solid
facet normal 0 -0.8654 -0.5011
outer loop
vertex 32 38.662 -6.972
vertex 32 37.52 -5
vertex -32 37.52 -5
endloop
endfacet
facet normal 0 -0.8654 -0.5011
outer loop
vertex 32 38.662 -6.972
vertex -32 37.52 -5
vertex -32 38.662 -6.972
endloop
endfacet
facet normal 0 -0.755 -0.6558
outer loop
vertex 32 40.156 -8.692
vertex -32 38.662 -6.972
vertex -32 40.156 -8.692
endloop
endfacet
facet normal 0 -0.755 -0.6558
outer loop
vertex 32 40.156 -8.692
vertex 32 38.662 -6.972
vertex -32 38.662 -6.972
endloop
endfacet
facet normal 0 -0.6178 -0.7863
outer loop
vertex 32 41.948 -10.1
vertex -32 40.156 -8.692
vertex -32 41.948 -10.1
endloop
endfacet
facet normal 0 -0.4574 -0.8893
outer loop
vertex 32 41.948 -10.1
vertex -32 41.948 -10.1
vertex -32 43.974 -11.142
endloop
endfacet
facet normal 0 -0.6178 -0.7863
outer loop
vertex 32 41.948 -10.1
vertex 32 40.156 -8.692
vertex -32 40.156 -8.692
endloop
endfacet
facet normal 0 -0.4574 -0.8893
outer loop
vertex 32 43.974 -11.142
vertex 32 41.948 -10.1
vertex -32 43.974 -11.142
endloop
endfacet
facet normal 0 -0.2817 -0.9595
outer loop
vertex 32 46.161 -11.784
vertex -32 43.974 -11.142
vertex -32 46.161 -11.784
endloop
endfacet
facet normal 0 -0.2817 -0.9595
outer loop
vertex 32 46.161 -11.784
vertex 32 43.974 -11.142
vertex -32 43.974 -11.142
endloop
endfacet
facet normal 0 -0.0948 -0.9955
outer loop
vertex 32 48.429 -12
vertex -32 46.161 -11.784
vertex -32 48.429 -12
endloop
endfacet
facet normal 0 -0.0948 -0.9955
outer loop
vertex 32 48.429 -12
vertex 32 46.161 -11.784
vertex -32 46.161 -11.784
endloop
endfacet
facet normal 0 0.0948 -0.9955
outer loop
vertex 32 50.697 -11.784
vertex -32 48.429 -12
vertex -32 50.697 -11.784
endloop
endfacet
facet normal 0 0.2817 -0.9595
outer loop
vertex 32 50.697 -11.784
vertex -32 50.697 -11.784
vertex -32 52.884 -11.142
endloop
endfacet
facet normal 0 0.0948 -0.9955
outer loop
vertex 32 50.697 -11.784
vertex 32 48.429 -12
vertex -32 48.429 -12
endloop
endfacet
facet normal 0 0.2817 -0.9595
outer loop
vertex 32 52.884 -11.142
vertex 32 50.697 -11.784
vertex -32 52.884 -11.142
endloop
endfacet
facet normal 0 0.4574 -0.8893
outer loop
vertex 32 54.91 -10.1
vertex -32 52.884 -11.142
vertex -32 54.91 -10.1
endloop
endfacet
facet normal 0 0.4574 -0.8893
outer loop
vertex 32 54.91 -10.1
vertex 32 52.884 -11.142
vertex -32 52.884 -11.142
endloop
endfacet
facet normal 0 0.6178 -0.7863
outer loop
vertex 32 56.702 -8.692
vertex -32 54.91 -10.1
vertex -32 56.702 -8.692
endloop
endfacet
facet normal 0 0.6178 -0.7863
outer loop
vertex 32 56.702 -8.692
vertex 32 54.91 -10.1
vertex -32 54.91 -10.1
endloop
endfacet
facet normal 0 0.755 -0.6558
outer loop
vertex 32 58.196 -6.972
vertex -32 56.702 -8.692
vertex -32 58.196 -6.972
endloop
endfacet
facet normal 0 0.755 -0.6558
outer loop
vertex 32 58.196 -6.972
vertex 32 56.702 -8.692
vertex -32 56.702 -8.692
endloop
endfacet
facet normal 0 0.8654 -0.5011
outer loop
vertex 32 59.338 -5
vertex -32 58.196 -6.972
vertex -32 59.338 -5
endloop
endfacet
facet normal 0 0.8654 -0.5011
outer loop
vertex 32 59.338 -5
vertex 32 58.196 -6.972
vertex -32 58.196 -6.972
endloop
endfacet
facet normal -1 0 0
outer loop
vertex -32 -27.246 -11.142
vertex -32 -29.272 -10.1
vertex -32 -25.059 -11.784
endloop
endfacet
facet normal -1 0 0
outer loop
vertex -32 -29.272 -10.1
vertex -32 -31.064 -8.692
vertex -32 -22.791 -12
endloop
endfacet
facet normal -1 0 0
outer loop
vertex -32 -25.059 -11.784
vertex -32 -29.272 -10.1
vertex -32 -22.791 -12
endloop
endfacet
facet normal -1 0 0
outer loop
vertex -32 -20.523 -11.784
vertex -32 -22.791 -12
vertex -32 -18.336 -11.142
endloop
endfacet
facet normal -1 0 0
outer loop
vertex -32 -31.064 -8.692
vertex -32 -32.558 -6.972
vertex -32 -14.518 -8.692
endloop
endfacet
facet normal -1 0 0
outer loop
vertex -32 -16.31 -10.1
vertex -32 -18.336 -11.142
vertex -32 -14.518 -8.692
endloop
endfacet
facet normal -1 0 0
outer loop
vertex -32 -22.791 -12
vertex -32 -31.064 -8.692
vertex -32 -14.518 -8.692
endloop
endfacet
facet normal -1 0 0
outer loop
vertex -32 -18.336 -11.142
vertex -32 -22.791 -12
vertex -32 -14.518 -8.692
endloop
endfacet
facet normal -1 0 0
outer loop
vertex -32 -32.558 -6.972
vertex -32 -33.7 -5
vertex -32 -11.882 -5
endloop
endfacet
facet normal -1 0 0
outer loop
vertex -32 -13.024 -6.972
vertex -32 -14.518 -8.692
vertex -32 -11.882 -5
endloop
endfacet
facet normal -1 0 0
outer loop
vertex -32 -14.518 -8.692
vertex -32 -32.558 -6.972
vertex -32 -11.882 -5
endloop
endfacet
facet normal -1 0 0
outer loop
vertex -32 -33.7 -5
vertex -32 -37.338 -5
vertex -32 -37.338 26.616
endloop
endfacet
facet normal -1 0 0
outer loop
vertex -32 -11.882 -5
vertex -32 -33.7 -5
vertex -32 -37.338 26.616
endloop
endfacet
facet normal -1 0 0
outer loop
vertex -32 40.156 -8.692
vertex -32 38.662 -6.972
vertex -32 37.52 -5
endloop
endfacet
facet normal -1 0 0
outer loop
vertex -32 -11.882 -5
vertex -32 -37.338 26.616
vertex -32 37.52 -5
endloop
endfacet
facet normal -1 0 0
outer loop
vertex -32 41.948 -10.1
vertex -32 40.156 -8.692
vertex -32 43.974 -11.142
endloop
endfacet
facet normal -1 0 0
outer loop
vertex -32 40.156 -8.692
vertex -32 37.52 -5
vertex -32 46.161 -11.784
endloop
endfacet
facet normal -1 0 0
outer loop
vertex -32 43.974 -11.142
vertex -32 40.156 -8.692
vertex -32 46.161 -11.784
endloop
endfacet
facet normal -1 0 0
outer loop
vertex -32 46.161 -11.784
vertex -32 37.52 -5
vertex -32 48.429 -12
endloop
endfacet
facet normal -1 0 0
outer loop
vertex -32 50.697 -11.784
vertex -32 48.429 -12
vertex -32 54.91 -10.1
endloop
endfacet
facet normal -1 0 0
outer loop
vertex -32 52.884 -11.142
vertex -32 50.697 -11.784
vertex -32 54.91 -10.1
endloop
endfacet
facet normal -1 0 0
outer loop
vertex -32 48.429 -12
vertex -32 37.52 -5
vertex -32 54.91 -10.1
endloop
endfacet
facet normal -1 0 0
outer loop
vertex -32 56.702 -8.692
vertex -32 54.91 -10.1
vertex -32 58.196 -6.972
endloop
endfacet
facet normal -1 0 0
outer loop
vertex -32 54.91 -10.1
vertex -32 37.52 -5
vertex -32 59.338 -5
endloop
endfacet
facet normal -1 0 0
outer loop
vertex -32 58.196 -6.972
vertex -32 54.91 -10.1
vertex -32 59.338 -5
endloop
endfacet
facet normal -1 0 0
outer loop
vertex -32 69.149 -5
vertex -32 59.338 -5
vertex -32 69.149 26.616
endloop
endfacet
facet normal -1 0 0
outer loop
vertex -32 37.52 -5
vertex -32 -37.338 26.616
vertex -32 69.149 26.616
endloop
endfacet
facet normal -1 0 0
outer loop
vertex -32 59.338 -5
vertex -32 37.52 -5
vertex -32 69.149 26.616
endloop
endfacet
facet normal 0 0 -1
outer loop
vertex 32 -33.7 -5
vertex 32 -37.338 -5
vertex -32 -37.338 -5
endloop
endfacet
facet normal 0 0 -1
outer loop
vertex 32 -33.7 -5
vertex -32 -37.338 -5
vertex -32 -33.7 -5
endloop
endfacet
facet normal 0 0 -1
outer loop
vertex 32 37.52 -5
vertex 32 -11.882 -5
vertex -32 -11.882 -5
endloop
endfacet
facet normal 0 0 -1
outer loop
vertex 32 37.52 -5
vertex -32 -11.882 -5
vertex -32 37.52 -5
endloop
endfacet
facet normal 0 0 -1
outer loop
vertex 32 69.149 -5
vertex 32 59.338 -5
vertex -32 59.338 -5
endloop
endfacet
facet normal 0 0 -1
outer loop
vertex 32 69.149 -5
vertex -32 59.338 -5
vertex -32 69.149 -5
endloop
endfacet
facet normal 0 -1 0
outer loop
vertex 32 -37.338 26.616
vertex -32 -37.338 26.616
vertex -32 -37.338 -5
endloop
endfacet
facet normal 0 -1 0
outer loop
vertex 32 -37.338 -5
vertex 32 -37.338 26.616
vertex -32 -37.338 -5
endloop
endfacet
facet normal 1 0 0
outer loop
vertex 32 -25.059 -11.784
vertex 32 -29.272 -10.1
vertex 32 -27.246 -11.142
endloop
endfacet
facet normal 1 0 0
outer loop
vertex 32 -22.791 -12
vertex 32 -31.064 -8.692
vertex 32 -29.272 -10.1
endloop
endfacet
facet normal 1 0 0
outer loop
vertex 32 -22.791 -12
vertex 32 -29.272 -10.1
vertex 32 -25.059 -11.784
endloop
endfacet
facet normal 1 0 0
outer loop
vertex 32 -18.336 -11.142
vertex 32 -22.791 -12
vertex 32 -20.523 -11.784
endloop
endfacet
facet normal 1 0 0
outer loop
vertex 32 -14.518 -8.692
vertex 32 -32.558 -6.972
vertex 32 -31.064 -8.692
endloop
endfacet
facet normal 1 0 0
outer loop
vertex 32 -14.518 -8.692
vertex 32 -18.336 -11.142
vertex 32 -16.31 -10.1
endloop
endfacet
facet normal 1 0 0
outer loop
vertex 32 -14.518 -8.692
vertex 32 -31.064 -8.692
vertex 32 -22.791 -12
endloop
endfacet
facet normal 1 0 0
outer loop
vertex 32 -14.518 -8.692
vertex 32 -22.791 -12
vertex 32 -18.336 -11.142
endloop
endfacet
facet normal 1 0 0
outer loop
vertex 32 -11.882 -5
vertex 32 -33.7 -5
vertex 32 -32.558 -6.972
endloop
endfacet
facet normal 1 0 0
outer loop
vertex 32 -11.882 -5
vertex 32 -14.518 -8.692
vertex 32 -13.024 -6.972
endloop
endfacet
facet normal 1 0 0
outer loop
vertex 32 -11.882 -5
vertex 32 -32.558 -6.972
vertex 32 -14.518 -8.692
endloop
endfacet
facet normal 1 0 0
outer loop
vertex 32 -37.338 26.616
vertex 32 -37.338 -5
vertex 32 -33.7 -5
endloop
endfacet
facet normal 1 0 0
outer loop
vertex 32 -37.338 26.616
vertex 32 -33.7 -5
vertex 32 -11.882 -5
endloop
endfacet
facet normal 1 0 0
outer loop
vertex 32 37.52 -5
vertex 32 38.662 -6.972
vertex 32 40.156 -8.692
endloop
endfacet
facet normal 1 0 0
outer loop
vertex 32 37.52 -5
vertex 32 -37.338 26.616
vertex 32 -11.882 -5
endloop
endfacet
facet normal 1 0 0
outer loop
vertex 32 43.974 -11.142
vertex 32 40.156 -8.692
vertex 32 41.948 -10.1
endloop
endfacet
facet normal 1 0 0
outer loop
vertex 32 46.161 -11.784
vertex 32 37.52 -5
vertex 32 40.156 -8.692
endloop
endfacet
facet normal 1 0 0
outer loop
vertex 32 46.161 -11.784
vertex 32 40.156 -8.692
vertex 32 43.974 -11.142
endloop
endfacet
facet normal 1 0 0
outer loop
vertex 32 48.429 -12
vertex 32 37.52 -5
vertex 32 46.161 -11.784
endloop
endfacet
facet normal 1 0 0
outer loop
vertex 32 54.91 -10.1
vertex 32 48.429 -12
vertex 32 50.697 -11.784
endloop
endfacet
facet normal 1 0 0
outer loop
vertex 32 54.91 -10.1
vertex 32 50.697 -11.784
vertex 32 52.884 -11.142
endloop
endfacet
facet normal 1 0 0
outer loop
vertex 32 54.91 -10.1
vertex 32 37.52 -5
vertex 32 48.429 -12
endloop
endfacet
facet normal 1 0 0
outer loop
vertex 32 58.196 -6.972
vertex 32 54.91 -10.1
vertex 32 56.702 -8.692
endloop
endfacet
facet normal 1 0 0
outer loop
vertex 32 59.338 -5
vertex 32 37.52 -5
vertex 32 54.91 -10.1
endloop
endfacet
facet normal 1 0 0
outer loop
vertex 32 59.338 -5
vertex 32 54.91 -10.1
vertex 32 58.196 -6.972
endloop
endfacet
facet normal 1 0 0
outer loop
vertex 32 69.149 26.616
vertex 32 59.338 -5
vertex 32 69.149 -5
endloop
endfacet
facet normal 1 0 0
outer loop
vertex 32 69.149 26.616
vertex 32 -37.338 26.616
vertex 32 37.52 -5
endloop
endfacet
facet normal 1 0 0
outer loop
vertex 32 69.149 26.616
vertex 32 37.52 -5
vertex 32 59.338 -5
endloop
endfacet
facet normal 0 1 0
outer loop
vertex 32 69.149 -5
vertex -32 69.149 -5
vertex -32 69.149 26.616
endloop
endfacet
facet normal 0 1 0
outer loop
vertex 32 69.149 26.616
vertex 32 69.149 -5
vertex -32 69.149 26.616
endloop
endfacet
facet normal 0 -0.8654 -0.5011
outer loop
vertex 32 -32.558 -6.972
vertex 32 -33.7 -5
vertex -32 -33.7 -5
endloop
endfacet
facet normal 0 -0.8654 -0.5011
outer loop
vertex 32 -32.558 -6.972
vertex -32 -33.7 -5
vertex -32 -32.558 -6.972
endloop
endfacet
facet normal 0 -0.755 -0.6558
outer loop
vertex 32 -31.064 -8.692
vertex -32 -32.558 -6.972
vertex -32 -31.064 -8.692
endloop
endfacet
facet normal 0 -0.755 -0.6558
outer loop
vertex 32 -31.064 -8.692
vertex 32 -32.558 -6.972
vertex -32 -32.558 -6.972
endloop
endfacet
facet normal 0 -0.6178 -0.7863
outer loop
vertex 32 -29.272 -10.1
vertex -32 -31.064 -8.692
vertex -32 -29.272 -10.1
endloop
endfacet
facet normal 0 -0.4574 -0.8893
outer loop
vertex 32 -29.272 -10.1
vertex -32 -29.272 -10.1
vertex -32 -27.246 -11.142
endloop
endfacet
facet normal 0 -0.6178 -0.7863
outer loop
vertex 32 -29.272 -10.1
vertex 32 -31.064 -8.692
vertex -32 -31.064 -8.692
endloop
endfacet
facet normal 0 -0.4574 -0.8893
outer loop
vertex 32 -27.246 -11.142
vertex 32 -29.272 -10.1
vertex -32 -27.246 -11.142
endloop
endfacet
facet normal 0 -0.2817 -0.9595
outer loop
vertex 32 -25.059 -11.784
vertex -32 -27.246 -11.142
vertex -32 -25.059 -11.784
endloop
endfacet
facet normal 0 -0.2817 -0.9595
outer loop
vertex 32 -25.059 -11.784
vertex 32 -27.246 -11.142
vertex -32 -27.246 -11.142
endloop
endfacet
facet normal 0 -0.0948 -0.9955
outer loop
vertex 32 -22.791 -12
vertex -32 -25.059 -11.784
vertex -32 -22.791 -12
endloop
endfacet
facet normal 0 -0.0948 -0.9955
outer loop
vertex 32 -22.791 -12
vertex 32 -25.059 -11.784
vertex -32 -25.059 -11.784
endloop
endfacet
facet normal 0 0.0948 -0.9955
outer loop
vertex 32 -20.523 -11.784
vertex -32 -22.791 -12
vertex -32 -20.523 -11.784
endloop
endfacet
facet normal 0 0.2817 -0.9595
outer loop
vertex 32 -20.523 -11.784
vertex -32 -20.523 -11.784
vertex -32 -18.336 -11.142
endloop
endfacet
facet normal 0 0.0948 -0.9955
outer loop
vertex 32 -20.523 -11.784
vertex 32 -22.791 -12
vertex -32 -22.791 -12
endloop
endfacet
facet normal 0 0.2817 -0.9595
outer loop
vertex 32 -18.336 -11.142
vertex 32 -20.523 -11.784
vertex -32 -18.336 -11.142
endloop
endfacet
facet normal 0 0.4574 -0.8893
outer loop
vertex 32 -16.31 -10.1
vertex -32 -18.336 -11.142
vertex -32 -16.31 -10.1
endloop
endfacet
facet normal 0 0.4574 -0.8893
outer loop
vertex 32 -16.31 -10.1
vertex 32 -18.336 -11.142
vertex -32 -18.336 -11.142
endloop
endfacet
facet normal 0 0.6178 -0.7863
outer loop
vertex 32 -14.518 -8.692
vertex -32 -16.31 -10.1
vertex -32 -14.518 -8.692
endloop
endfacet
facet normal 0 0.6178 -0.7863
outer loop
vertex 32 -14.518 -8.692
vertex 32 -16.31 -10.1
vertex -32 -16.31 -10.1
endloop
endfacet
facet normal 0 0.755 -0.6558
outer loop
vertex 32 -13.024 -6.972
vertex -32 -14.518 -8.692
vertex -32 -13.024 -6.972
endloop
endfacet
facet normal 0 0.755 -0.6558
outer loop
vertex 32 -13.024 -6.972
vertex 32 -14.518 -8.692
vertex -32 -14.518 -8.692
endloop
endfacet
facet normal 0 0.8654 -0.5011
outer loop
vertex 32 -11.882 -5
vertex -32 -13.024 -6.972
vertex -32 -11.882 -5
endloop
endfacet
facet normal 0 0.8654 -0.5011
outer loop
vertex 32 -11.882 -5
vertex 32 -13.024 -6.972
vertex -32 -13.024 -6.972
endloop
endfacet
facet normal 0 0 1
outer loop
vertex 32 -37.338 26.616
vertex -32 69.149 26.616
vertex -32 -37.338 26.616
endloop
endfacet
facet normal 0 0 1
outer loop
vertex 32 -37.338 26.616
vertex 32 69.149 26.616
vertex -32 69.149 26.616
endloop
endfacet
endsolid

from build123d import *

# Parameters (mm, degrees)
F1_DEPTH = 32


with BuildPart() as f1:
    # F0 (on Right) → F1 (new body, symmetric)
    with BuildSketch(Plane.YZ):
        with BuildLine():
            Line((-37.3383648694, 26.6163813695), (-37.3383648694, -5))
            Line((-37.3383648694, -5), (-33.6996619063, -5))
            ThreePointArc((-33.6996619063, -5), (-25.3498025253, 11.7240041235), (-10.7909497917, 0))
            ThreePointArc((-10.7909497917, 0), (-11.0669456682, -2.5588527336), (-11.882237677, -5))
            Line((-11.882237677, -5), (36.4290502083, -5))
            Line((36.4290502083, -5), (36.4290502083, 0))
            ThreePointArc((36.4290502083, 0), (48.4290502083, 12), (60.4290502083, 0))
            Line((60.4290502083, 0), (60.4290502083, -5))
            Line((60.4290502083, -5), (69.1487081349, -5))
            Line((69.1487081349, -5), (69.1487081349, 26.6163813695))
            Line((69.1487081349, 26.6163813695), (-37.3383648694, 26.6163813695))
        make_face()
        with BuildLine():
            Line((36.4290502083, 0), (36.4290502083, -5))
            Line((36.4290502083, -5), (37.5203380937, -5))
            ThreePointArc((37.5203380937, -5), (36.7050460848, -2.5588527336), (36.4290502083, 0))
        make_face()
        with BuildLine():
            ThreePointArc((-10.7909497917, 0), (-25.3498025253, 11.7240041235), (-33.6996619063, -5))
            Line((-33.6996619063, -5), (-11.882237677, -5))
            ThreePointArc((-11.882237677, -5), (-11.0669456682, -2.5588527336), (-10.7909497917, 0))
        make_face()
        with BuildLine():
            ThreePointArc((36.4290502083, 0), (36.7050460848, -2.5588527336), (37.5203380937, -5))
            Line((37.5203380937, -5), (59.337762323, -5))
            ThreePointArc((59.337762323, -5), (60.1530543318, -2.5588527336), (60.4290502083, 0))
            ThreePointArc((60.4290502083, 0), (48.4290502083, 12), (36.4290502083, 0))
        make_face()
        with BuildLine():
            Line((59.337762323, -5), (60.4290502083, -5))
            Line((60.4290502083, -5), (60.4290502083, 0))
            ThreePointArc((60.4290502083, 0), (60.1530543318, -2.5588527336), (59.337762323, -5))
        make_face()
        with BuildLine():
            Line((-11.882237677, -5), (-33.6996619063, -5))
            ThreePointArc((-33.6996619063, -5), (-22.7909497917, -12), (-11.882237677, -5))
        make_face()
        with BuildLine():
            Line((59.337762323, -5), (37.5203380937, -5))
            ThreePointArc((37.5203380937, -5), (48.4290502083, -12), (59.337762323, -5))
        make_face()
    extrude(amount=F1_DEPTH, both=True)


solid = f1.part
